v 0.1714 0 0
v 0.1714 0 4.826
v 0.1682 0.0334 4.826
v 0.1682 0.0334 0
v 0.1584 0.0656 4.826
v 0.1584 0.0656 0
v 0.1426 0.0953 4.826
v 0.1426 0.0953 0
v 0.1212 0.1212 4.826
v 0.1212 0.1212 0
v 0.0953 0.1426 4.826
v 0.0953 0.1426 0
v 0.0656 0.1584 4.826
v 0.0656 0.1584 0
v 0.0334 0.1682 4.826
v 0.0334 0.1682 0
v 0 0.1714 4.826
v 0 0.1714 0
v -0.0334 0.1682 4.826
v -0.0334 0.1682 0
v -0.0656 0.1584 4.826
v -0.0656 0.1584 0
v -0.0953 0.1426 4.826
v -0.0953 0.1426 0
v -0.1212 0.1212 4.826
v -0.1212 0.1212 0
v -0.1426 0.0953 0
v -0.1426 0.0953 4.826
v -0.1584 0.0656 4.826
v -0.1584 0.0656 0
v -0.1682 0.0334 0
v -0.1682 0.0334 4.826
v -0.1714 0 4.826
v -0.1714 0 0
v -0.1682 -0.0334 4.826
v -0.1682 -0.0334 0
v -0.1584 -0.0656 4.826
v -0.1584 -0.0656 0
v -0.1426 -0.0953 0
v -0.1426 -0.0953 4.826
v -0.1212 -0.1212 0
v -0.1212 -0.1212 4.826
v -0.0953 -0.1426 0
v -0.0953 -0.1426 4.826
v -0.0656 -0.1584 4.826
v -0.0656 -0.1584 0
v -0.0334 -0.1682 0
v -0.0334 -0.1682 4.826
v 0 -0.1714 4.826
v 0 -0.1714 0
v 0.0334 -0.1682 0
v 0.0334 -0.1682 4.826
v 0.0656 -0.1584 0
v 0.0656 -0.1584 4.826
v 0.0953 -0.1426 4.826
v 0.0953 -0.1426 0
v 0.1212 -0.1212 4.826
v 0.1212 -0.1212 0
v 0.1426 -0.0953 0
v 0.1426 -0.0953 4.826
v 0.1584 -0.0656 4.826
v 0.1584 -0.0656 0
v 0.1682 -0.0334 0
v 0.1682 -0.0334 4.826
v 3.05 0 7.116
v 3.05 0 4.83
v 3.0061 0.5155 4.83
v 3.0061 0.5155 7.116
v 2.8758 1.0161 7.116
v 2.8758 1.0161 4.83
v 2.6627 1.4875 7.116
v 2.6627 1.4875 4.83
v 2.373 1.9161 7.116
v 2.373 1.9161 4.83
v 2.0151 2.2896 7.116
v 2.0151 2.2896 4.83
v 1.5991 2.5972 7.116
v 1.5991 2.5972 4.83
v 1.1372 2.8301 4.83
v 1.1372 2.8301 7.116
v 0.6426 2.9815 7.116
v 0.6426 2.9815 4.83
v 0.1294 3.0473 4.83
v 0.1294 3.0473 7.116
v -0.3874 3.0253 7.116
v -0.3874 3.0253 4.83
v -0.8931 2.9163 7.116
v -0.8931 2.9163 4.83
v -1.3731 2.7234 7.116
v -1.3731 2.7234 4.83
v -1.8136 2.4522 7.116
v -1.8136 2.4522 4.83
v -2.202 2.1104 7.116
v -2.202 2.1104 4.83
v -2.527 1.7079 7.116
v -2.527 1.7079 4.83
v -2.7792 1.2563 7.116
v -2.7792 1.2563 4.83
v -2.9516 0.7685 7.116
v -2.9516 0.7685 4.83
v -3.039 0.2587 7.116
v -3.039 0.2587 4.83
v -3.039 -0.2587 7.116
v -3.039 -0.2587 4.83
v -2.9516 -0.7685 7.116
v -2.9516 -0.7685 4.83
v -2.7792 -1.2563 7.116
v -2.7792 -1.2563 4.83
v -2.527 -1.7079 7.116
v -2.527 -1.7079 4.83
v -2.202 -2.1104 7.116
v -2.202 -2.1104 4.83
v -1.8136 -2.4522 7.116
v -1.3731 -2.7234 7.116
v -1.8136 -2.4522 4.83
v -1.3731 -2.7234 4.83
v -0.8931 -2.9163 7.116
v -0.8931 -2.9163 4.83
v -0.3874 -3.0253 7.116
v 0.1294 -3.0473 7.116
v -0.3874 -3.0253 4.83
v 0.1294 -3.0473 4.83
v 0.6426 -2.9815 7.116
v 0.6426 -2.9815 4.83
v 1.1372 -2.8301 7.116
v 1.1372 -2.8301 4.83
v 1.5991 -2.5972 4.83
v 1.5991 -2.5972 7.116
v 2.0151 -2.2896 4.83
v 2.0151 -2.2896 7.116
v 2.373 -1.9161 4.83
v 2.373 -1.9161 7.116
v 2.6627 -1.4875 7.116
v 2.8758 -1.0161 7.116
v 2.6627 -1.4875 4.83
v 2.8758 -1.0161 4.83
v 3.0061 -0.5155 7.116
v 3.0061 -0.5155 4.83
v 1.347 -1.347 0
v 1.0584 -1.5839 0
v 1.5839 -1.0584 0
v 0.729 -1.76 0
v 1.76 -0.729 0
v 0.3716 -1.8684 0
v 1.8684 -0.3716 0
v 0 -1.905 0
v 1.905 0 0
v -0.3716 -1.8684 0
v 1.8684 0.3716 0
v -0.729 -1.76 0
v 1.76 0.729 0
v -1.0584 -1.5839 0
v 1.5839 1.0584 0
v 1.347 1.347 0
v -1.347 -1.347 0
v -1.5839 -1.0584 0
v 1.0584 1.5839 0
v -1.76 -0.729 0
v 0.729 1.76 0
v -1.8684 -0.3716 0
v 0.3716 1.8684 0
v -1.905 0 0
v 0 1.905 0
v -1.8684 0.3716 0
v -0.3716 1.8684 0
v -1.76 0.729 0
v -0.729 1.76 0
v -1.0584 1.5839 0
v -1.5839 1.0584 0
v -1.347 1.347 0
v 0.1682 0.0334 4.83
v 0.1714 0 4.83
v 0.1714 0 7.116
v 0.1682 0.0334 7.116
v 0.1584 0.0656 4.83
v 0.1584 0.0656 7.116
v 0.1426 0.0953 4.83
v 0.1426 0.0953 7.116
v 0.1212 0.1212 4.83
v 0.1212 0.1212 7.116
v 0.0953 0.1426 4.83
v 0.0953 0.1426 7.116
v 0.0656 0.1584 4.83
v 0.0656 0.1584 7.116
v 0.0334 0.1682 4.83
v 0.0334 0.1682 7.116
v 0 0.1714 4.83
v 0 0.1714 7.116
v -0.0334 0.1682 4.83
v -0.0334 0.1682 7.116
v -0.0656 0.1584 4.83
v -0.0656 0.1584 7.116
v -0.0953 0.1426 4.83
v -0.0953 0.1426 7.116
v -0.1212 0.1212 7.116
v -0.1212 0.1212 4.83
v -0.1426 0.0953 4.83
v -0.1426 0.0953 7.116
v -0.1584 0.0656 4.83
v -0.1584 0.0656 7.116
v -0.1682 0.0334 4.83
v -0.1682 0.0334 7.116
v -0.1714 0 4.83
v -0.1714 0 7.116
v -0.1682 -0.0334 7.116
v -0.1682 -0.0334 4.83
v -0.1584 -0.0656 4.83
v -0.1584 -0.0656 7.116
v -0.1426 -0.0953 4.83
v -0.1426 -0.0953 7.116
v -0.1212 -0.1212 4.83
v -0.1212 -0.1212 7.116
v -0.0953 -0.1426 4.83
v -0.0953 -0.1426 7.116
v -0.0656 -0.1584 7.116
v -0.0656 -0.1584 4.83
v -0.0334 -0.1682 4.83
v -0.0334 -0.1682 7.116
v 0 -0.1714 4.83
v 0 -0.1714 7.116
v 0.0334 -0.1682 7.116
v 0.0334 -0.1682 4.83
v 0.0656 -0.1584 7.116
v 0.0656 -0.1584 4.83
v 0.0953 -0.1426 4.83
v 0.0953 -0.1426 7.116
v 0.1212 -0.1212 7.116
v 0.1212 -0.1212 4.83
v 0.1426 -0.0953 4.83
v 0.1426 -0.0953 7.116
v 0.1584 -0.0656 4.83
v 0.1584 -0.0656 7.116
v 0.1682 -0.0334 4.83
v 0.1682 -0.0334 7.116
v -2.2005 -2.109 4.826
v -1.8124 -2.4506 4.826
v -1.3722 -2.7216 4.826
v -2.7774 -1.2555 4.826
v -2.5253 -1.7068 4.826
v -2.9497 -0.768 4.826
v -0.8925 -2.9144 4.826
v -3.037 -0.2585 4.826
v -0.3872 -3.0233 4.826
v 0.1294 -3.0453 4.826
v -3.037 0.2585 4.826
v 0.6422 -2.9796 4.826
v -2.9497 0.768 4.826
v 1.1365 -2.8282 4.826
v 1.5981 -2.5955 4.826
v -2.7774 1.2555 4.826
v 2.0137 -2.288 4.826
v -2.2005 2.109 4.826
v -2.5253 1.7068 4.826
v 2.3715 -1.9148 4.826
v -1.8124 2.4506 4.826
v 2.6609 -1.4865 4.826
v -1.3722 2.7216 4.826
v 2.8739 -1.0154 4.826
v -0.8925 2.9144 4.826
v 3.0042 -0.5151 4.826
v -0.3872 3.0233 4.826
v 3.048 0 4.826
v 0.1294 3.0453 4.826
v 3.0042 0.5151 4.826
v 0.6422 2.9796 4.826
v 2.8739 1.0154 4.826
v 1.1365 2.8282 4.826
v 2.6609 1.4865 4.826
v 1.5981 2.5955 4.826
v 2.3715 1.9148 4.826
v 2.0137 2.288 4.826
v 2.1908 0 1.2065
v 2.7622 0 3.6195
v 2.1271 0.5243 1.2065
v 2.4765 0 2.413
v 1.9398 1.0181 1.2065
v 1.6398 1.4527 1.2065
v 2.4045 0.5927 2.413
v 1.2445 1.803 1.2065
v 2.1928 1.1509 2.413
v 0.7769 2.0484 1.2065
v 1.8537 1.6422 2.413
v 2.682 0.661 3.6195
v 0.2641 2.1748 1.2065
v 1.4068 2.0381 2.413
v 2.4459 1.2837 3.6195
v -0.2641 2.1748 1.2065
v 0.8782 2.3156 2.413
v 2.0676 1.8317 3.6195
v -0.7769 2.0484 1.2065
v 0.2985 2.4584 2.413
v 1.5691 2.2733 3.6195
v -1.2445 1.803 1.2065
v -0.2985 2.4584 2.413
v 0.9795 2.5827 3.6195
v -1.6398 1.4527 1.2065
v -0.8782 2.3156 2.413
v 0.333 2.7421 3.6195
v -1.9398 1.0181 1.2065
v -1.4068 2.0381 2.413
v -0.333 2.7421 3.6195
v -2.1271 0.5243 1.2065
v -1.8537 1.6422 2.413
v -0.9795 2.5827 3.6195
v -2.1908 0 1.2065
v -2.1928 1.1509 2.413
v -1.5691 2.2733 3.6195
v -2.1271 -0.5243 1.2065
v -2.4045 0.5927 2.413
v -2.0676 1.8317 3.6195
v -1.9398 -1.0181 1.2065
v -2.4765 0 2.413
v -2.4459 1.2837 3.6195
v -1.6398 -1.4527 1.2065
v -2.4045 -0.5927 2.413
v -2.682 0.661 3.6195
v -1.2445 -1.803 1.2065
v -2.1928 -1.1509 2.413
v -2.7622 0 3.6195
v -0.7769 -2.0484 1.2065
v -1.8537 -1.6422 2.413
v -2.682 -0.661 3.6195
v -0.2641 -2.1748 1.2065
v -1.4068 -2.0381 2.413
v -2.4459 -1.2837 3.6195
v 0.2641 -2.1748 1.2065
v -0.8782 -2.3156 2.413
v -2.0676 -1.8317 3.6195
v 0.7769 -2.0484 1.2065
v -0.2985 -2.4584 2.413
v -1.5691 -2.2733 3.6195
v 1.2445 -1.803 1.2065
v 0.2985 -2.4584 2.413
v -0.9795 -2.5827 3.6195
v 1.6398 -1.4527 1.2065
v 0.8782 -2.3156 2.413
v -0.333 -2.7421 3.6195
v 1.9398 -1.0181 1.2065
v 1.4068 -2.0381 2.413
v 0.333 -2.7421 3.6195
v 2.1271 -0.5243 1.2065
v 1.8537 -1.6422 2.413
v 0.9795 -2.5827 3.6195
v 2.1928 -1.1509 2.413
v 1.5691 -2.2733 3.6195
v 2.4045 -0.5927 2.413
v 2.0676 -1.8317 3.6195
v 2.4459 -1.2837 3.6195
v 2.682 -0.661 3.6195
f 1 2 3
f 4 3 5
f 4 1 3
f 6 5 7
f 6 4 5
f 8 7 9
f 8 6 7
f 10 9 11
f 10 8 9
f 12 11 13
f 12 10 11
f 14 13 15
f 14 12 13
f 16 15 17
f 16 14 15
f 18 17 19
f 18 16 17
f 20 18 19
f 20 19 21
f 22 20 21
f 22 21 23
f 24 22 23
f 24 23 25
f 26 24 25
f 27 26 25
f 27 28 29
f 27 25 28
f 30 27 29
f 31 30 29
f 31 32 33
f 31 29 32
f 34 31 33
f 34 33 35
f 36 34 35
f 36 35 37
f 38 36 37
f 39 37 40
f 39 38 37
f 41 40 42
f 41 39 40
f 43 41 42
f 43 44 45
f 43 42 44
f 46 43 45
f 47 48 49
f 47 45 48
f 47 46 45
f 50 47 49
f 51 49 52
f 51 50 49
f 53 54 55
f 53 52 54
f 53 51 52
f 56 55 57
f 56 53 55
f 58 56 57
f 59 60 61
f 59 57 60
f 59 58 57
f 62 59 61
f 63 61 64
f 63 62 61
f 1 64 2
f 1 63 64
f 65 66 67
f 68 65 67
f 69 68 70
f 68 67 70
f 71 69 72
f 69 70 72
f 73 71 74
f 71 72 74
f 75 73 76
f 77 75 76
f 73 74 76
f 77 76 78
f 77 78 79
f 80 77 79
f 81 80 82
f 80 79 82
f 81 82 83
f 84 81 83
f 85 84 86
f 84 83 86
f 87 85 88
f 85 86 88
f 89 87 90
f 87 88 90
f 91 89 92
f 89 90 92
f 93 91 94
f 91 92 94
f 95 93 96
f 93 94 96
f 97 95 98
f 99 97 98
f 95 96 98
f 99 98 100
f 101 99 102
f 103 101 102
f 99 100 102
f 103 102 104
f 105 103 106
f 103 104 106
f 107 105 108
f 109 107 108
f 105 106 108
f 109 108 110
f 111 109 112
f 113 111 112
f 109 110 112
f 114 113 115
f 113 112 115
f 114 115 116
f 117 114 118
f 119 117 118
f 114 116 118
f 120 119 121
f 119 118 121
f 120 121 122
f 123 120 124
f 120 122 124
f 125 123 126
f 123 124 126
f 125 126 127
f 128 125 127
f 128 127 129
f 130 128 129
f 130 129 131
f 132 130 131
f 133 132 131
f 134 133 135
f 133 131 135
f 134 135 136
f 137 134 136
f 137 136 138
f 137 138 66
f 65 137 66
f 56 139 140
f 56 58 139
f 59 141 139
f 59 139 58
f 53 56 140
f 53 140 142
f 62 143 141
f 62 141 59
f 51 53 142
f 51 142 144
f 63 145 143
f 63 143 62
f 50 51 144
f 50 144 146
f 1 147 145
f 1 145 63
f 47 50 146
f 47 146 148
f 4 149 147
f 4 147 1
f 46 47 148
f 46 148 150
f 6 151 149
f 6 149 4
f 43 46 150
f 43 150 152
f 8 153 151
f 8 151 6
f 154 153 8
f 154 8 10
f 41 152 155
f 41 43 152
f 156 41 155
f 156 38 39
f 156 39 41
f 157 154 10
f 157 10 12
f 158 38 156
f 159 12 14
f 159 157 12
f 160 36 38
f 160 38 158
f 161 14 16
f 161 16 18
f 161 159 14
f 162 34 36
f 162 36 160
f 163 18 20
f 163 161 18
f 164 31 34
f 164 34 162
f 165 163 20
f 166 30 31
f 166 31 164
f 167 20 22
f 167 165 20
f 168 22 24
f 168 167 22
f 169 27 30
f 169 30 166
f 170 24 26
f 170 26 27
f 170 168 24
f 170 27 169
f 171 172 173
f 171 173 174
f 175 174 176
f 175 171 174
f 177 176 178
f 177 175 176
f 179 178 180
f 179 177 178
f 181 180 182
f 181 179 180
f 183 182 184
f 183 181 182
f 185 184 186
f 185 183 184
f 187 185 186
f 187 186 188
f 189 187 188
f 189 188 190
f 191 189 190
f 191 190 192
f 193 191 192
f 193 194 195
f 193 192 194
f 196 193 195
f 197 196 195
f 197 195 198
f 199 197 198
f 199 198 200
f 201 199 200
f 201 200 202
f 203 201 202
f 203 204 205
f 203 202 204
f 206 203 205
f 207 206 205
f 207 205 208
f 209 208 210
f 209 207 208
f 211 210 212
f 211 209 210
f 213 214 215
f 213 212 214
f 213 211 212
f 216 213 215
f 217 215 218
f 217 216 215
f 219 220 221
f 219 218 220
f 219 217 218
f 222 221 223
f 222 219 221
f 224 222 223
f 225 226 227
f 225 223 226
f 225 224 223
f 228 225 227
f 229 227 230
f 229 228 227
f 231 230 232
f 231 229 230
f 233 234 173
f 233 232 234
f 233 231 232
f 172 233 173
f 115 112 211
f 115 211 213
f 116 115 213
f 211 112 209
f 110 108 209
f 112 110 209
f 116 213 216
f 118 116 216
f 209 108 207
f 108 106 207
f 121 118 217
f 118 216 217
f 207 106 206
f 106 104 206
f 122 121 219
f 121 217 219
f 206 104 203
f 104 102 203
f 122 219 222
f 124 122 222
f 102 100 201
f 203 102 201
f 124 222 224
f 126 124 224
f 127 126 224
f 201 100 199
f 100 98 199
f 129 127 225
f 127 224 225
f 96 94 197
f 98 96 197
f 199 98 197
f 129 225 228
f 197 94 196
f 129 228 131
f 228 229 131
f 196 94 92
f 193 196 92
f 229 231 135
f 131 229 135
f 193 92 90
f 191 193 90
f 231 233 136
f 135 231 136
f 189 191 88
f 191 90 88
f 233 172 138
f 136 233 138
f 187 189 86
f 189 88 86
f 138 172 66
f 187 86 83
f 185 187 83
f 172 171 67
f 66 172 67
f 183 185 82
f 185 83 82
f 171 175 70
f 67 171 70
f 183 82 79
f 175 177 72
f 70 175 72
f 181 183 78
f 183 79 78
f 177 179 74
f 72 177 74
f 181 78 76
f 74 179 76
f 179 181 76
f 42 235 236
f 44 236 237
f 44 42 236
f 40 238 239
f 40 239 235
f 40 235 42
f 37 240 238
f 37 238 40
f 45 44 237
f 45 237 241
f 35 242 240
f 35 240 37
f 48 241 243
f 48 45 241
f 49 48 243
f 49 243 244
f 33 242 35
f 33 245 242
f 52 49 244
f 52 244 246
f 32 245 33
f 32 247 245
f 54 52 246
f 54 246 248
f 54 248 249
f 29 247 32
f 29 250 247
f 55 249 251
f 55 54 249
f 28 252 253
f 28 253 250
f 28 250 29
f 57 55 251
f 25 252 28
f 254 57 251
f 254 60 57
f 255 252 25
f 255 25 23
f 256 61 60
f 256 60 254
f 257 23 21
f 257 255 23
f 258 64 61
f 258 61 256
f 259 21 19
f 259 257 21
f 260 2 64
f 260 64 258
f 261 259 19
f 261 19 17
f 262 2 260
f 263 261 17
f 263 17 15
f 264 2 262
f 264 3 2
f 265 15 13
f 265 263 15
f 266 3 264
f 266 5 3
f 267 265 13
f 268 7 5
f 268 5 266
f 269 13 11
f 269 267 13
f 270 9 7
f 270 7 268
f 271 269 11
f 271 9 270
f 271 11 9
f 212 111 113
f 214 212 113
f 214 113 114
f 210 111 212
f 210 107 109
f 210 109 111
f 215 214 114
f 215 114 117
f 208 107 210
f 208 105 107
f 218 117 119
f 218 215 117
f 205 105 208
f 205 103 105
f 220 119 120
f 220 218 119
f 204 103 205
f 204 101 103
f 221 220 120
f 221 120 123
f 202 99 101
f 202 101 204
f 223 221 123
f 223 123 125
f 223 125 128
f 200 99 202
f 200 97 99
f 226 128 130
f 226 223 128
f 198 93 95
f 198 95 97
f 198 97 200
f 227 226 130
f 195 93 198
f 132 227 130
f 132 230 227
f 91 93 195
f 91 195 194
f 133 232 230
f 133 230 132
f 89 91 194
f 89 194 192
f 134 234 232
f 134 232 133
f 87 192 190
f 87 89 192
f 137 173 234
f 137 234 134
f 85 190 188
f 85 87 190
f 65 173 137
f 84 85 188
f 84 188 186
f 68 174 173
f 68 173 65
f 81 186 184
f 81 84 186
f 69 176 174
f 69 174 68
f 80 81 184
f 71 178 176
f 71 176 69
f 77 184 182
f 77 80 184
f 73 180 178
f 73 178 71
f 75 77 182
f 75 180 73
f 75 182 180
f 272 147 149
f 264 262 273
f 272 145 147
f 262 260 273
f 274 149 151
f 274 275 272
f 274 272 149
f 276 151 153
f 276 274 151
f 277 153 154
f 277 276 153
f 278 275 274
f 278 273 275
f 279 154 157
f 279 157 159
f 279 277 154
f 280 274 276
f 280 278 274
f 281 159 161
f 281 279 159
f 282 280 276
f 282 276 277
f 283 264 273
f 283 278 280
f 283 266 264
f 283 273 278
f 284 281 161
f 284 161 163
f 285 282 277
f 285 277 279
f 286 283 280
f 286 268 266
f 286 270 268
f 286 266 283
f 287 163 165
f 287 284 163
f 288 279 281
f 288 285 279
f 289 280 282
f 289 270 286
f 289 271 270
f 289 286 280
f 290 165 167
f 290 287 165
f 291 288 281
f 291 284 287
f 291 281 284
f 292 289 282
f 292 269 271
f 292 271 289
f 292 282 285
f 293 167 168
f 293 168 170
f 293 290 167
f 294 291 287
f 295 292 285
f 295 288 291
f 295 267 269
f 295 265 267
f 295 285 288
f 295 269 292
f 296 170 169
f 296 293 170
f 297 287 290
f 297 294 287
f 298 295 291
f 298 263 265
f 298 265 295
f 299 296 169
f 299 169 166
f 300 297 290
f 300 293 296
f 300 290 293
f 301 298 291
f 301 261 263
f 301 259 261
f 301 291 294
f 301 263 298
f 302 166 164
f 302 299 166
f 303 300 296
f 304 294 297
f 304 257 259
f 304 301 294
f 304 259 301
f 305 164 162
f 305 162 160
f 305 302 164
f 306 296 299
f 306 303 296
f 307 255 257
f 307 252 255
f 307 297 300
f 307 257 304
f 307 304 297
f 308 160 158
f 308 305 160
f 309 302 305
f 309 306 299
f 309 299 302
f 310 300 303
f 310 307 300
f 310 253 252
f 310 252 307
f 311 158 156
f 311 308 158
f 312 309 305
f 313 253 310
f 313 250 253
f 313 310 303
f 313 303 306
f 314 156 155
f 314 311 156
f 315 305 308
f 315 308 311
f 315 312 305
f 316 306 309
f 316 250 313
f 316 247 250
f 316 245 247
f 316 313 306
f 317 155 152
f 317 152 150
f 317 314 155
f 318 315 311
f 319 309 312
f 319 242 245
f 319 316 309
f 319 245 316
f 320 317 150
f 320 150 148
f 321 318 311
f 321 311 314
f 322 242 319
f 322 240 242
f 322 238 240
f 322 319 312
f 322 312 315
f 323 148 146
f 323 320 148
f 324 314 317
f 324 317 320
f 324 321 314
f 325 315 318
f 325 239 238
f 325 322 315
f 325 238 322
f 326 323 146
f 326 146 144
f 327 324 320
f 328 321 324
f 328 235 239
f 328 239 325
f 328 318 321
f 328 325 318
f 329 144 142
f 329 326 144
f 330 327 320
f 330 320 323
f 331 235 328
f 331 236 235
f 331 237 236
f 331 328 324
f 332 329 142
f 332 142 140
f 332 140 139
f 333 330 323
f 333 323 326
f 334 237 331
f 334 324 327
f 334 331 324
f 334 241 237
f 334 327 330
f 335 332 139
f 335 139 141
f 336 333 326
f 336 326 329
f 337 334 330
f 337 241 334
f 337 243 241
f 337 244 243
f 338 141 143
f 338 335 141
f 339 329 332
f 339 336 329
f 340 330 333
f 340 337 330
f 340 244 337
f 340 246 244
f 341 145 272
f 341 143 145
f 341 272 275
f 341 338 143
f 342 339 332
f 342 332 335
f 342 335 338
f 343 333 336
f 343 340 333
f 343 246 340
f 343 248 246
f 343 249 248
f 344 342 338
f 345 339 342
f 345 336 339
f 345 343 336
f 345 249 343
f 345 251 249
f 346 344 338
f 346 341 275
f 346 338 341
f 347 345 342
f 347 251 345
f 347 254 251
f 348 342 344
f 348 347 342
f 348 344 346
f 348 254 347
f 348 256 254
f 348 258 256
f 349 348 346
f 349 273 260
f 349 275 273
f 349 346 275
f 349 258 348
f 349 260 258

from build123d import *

# Parameters (mm, degrees)
CYLINDER001_R     = 0.17145
CYLINDER001_DEPTH = 7.12
CYLINDER_R        = 3.05
CYLINDER_DEPTH    = 2.286


with BuildPart() as fiber0:
    # Cylinder001 → Cylinder001 (new body)
    with BuildSketch(Plane.XY):
        Circle(CYLINDER001_R)
    extrude(amount=CYLINDER001_DEPTH)


with BuildPart() as cylinder:
    # Cylinder → Cylinder (new body)
    with BuildSketch(Plane.XY.offset(4.83)):
        Circle(CYLINDER_R)
    extrude(amount=CYLINDER_DEPTH)


with BuildPart() as swagelokfiberferrulesingle0_125in:
    # Cone → Cone (revolve)
    with BuildSketch(Plane.XZ):
        Polygon((0, 0), (1.905, 0), (3.048, 4.826), (0, 4.826), align=None)
    revolve(axis=Axis((0, 0, 0), (0, 0, 1)))

    # Fusion: union Cylinder
    add(cylinder.part)

    # Cut: cut Fiber0
    add(fiber0.part, mode=Mode.SUBTRACT)


solid = swagelokfiberferrulesingle0_125in.part
